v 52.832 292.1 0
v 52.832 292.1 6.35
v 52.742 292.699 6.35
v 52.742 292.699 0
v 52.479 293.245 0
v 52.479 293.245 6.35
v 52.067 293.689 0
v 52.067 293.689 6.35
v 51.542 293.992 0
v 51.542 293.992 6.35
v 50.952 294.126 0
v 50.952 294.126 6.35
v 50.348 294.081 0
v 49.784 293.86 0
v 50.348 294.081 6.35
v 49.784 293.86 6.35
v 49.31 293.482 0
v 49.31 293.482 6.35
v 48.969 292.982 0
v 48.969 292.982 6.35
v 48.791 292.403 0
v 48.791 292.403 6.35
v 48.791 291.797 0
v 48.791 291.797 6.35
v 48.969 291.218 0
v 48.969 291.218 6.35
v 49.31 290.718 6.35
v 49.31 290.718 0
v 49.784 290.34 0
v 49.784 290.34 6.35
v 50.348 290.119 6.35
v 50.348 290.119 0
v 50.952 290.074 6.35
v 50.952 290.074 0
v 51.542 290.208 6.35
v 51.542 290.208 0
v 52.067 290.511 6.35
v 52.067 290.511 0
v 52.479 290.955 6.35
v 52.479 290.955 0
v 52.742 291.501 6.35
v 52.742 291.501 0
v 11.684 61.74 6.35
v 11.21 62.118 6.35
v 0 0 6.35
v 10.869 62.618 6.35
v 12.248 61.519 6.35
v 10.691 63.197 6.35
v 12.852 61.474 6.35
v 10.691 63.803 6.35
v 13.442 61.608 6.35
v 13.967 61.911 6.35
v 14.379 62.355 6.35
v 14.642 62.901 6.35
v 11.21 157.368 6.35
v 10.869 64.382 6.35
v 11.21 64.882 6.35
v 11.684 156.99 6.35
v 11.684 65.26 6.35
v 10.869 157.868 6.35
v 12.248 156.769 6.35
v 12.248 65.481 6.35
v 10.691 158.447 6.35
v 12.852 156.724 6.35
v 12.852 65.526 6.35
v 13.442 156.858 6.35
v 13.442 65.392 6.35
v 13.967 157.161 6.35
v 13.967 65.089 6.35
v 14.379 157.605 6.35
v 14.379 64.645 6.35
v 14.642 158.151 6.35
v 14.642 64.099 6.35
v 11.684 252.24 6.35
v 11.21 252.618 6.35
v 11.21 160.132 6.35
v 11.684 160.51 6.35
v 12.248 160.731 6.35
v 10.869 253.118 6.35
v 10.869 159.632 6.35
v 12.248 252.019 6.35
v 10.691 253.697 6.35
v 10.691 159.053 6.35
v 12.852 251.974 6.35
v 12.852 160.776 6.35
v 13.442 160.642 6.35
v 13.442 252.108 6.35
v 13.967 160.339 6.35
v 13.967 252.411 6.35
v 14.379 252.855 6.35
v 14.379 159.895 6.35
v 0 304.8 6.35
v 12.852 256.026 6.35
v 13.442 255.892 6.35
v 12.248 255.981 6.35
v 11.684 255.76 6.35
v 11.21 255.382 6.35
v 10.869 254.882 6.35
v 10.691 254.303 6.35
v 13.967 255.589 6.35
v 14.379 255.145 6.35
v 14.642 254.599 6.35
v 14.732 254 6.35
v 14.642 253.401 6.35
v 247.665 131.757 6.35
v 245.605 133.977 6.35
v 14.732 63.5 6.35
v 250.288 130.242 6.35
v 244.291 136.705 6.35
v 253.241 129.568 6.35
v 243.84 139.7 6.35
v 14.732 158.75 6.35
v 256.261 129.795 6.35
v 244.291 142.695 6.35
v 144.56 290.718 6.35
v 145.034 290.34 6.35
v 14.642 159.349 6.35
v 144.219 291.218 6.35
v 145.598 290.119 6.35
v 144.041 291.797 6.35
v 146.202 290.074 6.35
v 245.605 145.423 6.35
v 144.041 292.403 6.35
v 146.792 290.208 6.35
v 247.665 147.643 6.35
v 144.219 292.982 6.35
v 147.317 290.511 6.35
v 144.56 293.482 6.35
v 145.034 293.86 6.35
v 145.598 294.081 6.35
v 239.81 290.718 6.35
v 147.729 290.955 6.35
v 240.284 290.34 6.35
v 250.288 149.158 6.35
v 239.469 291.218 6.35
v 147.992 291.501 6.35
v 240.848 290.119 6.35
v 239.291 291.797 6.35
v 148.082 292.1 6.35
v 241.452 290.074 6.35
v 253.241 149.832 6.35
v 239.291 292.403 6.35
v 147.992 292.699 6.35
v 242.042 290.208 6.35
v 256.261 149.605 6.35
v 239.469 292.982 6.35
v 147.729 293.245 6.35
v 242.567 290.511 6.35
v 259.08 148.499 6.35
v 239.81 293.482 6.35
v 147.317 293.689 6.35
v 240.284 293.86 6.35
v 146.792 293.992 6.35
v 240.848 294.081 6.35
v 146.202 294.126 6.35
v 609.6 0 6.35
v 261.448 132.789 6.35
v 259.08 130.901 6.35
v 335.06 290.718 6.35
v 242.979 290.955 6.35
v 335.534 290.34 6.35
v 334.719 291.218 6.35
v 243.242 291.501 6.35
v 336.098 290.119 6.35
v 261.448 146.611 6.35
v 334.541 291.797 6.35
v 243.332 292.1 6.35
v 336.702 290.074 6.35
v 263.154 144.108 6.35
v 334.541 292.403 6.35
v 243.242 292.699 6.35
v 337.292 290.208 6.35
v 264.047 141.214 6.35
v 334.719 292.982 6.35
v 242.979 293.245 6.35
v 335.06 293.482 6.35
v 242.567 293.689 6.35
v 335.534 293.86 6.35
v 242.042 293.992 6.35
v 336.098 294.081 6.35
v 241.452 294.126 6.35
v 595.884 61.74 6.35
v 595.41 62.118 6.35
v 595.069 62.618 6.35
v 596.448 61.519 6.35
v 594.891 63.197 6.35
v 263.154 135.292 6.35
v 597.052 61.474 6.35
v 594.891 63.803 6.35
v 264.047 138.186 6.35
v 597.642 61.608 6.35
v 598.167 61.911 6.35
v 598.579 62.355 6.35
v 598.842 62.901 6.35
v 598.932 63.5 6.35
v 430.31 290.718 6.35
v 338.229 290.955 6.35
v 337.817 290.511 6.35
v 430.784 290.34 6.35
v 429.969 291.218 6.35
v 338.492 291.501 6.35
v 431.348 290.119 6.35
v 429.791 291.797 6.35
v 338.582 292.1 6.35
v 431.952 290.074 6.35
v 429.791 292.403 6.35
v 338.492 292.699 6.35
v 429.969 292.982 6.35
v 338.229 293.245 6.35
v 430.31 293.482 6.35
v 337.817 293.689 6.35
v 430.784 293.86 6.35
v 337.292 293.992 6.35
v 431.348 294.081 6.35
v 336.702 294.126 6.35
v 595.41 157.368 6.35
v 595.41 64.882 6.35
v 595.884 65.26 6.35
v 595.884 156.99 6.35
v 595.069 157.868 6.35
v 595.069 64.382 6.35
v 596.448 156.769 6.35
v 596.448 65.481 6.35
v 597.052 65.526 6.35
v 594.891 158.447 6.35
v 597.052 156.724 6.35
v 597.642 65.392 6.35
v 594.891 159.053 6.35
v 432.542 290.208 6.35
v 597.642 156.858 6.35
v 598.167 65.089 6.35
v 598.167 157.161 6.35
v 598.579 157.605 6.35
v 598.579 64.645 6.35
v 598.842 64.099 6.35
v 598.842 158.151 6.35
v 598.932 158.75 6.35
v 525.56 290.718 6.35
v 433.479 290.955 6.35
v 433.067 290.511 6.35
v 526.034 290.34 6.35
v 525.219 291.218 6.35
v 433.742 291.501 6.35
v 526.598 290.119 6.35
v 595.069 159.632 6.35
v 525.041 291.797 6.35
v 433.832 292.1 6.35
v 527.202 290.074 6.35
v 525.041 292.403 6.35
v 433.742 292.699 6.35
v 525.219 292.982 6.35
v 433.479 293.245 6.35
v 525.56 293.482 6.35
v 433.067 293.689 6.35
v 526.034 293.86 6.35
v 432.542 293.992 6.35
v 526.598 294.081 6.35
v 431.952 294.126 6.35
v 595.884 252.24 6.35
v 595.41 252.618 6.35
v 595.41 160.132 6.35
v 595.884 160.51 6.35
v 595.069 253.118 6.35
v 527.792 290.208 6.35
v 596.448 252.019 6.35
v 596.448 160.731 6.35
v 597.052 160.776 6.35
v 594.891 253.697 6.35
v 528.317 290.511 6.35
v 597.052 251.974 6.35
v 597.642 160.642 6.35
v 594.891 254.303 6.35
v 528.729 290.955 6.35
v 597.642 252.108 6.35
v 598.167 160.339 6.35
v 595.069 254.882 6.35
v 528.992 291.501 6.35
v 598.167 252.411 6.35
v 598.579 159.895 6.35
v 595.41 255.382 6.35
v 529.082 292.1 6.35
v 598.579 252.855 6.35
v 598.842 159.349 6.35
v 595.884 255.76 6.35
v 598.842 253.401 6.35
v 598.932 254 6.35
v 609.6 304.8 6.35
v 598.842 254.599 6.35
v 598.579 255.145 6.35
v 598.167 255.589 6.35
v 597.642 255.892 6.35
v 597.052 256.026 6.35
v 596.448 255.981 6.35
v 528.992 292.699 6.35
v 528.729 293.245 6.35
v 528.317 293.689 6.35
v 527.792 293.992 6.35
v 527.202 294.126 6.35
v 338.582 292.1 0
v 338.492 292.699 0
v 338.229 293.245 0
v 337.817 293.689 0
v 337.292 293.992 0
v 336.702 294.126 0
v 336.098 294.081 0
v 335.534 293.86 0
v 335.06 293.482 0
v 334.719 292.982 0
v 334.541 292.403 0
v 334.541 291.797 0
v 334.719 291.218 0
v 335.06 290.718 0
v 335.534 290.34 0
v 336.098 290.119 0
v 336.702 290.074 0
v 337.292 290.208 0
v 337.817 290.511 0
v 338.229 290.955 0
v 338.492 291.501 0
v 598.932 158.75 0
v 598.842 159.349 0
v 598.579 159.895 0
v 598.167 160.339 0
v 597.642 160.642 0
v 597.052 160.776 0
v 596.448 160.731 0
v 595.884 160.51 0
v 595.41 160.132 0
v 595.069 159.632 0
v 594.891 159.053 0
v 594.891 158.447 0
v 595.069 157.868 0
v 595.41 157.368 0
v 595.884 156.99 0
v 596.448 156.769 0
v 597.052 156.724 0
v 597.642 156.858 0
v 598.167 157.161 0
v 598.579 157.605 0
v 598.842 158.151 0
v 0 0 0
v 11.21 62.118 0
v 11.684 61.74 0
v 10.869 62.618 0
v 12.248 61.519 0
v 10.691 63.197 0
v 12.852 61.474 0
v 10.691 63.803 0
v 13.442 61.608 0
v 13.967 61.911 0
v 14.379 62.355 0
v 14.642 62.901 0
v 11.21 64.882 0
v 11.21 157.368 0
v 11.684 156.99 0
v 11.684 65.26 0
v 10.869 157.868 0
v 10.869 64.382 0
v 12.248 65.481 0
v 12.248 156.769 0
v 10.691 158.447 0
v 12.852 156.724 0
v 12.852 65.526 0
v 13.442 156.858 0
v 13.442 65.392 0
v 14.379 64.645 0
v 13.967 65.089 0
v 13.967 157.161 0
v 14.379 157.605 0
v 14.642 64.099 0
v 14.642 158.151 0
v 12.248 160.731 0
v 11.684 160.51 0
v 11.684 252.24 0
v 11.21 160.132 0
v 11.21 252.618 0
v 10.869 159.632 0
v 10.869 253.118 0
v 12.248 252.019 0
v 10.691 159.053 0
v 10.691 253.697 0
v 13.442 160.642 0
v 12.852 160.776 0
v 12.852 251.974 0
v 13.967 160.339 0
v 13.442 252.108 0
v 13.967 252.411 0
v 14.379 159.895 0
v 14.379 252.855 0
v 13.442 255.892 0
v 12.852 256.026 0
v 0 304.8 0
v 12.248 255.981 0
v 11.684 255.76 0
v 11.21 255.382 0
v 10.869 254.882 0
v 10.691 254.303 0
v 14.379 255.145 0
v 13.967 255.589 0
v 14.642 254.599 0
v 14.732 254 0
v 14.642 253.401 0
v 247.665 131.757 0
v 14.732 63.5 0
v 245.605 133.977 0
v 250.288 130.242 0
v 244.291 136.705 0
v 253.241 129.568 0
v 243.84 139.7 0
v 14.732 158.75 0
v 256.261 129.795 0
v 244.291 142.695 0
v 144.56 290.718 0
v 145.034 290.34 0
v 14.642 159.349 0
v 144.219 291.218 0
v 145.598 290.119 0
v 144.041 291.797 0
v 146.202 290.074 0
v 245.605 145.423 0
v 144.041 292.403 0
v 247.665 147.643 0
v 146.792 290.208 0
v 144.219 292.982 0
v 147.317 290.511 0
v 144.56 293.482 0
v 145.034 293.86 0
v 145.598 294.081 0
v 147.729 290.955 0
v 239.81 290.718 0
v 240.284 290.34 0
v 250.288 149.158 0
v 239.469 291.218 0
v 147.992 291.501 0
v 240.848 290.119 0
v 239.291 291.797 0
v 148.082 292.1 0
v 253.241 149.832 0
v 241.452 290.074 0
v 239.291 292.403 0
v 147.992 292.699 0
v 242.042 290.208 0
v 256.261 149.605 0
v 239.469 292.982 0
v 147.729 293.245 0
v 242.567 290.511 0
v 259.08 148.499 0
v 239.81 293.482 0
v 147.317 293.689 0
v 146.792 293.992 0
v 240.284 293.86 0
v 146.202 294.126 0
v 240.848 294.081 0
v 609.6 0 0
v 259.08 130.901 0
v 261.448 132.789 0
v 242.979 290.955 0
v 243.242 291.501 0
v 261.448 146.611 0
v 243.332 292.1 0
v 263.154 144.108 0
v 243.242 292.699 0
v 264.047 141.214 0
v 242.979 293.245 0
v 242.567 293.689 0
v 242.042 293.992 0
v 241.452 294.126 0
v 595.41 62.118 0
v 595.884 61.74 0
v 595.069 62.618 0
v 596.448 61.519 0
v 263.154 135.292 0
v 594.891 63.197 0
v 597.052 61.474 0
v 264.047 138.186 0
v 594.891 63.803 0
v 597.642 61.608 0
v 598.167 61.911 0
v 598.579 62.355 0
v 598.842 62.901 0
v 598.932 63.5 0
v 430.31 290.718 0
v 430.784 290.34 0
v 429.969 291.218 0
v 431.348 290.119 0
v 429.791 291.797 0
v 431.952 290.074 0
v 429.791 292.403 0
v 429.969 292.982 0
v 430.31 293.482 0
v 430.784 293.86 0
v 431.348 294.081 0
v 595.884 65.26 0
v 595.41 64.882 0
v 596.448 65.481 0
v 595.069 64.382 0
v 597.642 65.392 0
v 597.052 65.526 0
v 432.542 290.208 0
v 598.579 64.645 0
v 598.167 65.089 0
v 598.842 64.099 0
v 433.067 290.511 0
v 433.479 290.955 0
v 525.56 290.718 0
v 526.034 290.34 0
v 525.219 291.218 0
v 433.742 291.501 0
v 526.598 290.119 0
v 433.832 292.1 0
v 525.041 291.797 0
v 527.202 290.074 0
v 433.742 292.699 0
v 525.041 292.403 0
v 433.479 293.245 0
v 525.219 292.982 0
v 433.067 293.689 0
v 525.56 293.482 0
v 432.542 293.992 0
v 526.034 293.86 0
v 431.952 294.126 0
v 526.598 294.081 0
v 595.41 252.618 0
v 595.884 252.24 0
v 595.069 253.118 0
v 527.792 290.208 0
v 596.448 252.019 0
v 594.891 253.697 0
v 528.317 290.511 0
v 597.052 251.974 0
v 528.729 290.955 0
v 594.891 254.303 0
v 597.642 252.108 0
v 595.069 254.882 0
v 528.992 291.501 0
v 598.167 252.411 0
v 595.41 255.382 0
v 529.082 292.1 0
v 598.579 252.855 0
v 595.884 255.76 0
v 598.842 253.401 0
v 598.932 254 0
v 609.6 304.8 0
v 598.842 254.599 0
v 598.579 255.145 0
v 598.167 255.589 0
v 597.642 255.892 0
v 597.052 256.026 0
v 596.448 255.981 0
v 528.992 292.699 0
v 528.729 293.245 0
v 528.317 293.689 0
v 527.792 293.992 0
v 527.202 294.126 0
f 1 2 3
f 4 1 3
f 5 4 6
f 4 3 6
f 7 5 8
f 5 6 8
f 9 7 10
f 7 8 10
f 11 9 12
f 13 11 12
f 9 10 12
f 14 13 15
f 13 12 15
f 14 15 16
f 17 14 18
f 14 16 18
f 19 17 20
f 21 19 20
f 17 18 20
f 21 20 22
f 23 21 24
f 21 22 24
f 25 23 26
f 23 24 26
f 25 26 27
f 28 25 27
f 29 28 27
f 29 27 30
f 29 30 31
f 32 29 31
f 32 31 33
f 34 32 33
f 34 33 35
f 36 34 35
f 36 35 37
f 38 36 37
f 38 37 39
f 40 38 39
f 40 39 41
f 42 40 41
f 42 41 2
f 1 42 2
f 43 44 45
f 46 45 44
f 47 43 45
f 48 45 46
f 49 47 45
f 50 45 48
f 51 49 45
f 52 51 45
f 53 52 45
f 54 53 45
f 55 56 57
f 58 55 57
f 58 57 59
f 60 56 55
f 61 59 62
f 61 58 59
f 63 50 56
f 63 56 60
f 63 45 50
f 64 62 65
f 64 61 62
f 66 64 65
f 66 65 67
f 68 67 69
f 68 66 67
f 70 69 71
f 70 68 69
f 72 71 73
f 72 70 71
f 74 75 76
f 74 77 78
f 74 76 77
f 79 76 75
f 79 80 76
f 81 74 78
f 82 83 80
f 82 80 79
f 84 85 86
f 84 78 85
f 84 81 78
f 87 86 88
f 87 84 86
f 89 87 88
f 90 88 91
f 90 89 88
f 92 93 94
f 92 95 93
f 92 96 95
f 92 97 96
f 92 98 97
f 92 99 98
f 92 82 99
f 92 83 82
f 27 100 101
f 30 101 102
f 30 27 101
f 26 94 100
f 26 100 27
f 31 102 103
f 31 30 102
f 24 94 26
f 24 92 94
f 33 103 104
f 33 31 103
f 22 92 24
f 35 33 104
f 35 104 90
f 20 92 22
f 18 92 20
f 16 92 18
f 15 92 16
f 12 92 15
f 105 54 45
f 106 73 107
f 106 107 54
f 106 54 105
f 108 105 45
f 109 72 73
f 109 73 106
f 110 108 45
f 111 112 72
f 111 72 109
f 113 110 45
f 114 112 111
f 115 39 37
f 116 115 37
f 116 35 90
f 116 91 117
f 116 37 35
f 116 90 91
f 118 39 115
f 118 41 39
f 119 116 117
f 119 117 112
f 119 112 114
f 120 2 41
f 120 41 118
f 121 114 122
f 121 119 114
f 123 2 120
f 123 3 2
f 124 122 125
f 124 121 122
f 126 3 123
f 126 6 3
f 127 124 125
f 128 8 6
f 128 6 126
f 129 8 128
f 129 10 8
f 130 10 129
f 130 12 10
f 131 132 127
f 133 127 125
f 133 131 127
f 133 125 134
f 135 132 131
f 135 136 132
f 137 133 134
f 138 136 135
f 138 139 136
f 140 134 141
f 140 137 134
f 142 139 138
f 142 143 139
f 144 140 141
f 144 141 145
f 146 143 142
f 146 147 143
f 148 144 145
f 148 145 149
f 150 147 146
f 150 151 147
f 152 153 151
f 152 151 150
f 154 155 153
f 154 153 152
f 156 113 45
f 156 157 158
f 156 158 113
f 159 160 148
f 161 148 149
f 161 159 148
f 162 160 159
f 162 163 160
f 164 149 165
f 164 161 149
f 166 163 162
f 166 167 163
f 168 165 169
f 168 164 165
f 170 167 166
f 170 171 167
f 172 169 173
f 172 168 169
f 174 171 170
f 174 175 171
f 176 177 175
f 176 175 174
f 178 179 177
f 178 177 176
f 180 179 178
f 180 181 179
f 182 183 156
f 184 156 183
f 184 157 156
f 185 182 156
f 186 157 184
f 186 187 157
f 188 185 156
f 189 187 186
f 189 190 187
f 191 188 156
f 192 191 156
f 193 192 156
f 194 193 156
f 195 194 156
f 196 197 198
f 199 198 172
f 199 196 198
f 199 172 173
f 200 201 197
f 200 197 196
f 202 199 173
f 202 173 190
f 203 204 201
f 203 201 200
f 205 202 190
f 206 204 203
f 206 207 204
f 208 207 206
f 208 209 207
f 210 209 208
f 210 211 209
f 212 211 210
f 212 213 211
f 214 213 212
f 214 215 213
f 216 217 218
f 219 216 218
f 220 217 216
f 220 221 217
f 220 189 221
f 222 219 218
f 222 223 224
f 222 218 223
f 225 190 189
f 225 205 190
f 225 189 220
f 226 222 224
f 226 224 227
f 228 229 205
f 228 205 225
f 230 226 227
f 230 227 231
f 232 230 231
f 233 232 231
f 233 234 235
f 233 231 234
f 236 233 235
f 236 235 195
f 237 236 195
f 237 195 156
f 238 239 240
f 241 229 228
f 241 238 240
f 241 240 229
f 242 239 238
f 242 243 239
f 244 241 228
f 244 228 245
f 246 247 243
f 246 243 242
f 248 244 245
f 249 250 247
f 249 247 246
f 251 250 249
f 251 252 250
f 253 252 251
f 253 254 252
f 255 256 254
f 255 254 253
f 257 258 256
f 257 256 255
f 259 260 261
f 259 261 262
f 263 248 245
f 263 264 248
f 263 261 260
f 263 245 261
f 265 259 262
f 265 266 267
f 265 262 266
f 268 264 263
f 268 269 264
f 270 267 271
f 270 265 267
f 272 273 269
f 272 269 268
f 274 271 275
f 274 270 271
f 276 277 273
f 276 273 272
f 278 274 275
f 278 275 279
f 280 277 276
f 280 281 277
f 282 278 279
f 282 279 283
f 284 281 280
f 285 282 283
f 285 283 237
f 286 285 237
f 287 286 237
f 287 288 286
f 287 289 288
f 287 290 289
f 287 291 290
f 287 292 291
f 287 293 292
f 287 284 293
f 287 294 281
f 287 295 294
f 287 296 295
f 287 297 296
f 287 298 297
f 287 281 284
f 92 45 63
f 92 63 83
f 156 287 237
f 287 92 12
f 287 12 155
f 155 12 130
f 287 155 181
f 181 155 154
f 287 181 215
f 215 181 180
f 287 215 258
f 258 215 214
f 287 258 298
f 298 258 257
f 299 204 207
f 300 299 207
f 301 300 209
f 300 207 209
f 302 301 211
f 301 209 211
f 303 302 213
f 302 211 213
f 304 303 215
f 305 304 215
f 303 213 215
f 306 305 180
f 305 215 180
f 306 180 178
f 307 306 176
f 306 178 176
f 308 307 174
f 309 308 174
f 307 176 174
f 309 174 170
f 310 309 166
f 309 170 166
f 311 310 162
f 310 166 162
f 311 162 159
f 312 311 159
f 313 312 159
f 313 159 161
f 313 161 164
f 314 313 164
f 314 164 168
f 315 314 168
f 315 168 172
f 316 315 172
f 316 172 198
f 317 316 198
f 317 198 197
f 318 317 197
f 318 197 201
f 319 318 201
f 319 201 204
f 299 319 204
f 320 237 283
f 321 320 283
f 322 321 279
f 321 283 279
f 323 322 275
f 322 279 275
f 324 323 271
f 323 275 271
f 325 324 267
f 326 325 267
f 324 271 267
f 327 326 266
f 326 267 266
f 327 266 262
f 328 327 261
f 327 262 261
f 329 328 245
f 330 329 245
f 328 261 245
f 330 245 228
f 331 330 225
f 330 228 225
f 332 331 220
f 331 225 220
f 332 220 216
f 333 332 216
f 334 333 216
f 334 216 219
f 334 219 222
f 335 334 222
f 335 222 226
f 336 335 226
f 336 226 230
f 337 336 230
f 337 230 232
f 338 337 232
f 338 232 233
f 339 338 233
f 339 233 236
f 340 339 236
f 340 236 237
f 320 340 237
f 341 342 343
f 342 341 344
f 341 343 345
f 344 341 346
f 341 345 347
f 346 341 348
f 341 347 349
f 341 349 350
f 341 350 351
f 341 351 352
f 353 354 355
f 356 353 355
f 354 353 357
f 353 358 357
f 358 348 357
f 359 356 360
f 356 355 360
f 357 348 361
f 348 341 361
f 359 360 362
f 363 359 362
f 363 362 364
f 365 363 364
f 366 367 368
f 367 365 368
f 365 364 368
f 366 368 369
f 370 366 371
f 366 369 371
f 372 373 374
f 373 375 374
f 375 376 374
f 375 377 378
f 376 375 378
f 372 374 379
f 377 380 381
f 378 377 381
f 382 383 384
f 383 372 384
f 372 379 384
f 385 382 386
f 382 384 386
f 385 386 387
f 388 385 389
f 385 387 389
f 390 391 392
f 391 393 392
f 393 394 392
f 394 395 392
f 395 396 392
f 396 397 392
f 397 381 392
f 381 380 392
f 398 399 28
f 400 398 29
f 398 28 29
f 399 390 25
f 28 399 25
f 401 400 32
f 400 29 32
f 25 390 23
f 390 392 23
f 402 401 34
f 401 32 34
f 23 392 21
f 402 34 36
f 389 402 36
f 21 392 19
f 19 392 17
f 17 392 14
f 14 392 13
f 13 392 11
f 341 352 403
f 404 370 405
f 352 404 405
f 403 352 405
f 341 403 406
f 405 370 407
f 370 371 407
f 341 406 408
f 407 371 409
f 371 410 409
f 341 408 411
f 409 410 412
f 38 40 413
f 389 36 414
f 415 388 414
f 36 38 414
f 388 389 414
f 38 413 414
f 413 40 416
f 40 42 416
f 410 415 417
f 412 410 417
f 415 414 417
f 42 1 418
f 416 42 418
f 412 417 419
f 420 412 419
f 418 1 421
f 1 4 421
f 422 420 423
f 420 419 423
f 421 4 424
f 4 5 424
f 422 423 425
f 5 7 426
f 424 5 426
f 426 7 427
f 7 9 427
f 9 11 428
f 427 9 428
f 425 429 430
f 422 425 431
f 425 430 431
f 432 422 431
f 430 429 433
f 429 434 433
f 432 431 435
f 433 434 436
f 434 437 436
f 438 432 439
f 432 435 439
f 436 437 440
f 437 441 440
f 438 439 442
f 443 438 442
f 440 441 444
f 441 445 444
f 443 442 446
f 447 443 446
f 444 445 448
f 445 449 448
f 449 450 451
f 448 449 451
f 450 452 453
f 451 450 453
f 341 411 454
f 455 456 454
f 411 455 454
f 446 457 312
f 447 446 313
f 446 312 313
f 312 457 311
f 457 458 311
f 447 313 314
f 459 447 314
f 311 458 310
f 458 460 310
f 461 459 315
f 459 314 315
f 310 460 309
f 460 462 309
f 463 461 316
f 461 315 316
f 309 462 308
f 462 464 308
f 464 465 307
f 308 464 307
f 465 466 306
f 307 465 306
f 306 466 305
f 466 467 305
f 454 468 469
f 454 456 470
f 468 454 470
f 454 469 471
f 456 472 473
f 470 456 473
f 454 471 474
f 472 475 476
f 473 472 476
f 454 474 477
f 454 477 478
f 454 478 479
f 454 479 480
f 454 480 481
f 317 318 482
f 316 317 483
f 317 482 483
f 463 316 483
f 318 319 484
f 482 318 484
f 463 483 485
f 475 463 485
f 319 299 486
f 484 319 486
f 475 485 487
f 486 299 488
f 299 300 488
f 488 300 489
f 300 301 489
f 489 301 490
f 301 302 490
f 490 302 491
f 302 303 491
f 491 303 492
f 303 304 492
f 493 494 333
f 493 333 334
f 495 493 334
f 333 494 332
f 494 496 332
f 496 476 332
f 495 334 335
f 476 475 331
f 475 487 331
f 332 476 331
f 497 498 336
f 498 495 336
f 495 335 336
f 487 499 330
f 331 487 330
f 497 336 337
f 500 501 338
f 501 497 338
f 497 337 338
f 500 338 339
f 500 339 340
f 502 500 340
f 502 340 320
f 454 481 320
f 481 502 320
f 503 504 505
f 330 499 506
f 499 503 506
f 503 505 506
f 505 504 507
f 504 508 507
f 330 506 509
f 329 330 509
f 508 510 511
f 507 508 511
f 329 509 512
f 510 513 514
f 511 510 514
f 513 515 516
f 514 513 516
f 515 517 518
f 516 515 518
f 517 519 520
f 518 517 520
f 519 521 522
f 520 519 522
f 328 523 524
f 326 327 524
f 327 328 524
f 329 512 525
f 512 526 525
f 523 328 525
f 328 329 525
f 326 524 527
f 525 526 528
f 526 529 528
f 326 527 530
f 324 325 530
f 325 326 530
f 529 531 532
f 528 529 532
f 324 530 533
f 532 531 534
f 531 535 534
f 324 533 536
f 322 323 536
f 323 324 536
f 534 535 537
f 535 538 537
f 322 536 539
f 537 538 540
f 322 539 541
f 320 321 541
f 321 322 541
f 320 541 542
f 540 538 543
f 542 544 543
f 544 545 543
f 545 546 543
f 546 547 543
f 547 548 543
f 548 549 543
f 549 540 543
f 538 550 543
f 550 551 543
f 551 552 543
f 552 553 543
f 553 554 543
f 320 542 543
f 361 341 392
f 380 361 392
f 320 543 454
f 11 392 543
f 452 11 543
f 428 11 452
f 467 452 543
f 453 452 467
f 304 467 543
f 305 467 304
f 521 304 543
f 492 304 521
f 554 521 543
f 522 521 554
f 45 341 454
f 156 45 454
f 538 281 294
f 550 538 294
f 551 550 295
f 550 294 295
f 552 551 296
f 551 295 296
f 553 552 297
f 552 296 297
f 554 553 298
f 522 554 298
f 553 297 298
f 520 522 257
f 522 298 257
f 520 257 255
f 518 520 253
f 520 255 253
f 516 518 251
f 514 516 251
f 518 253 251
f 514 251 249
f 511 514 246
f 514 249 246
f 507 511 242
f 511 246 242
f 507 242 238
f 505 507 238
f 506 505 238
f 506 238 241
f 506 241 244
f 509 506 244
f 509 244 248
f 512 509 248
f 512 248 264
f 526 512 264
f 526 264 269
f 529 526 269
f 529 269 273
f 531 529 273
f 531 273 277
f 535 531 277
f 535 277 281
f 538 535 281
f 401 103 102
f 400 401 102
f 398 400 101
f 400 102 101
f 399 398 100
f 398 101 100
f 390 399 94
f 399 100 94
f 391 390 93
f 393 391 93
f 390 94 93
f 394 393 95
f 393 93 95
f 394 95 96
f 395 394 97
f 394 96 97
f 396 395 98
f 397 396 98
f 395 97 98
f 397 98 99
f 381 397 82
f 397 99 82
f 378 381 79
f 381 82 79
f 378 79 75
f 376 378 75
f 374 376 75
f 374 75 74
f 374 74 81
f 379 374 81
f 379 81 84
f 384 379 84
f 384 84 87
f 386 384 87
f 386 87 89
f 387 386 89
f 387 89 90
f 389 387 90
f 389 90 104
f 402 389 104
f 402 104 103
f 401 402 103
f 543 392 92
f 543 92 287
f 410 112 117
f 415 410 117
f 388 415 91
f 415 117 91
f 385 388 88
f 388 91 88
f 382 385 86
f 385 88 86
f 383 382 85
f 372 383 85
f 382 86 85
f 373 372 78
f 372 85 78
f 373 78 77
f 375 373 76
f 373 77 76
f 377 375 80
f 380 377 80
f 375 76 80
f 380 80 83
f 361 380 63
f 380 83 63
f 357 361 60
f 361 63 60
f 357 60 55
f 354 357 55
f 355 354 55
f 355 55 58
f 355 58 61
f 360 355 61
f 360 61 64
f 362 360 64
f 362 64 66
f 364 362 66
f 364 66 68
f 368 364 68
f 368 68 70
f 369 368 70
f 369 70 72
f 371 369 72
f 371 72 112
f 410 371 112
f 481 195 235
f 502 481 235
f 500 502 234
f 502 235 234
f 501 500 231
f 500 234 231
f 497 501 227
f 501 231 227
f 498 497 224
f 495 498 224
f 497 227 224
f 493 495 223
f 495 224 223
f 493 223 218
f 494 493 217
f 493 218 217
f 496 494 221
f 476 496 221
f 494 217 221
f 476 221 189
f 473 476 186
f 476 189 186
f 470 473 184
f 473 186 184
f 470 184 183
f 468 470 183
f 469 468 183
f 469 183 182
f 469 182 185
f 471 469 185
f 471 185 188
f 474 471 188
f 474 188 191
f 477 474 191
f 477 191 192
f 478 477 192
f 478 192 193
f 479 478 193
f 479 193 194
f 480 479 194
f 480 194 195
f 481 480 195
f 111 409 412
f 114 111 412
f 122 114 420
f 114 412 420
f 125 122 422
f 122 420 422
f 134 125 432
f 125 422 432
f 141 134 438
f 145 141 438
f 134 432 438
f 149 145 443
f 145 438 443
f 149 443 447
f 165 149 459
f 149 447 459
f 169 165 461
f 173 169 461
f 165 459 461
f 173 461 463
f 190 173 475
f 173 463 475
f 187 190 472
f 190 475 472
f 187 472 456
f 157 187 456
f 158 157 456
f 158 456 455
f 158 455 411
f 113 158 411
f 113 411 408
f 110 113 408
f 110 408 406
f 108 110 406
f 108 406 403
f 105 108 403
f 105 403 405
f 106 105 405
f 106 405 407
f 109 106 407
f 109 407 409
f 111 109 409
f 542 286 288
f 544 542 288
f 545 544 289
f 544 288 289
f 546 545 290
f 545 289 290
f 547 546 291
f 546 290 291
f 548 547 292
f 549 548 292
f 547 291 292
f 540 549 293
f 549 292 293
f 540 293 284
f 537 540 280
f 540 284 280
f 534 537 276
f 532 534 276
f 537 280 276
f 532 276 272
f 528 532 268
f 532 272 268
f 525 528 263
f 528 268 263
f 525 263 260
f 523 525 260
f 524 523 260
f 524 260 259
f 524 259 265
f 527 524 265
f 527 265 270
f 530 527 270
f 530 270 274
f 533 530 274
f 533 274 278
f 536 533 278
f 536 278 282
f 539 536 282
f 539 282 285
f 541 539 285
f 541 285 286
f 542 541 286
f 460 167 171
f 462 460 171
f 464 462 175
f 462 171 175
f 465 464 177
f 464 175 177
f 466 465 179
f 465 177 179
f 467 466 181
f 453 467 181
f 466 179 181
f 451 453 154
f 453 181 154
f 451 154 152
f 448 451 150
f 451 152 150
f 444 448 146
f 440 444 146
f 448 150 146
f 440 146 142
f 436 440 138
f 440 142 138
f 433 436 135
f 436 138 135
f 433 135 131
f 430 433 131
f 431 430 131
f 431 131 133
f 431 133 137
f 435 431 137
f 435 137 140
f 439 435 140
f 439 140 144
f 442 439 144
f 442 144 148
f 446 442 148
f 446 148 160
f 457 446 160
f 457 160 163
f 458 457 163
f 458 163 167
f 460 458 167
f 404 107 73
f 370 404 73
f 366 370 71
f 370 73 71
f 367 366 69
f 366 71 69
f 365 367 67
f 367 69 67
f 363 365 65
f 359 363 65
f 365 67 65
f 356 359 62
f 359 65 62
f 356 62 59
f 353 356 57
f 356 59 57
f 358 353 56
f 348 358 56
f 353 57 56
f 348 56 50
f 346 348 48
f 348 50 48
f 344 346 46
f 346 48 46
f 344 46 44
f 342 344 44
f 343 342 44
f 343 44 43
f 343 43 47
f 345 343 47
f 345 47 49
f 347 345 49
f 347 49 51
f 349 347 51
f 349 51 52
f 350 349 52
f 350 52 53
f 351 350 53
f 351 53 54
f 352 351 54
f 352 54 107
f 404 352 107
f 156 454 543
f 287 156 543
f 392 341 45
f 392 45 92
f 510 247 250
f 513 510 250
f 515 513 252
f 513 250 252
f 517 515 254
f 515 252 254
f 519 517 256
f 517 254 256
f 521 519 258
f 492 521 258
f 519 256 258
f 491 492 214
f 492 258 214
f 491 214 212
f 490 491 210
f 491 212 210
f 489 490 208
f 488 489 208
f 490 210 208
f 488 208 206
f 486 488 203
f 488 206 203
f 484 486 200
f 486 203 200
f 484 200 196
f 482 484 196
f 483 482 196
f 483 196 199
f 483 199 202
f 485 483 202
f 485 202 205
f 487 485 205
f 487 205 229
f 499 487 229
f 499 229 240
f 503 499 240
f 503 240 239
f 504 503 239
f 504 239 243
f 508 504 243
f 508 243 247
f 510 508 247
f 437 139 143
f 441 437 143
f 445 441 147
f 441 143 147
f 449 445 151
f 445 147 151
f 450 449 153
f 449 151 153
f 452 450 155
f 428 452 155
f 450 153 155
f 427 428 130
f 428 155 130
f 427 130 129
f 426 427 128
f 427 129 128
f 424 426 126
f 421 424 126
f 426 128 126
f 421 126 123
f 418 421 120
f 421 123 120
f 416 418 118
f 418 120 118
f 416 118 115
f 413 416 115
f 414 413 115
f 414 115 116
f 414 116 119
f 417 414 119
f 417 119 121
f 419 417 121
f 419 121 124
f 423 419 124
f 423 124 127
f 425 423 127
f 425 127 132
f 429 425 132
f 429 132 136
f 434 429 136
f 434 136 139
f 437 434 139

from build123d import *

# Parameters (mm, degrees)
SKETCH1_W           = 609.6
SKETCH1_H           = 304.8
BOSS_EXTRUDE1_DEPTH = 6.35
SKETCH2_R           = 2.032
CUT_EXTRUDE4_DEPTH  = 7.35
SKETCH4_R           = 2.032
CUT_EXTRUDE7_DEPTH  = 7.35
SKETCH5_R           = 10.16
CUT_EXTRUDE8_DEPTH  = 7.35


with BuildPart() as part:
    # Sketch1 → Boss-Extrude1 (new body)
    with BuildSketch(Plane.XY):
        with Locations((304.8, 152.4)):
            Rectangle(SKETCH1_W, SKETCH1_H)
    extrude(amount=BOSS_EXTRUDE1_DEPTH)

    # Sketch2 → Cut-Extrude4 (cut, through all)
    with BuildSketch(Plane.XY.offset(6.35)):
        with Locations((12.7, 254)):
            Circle(SKETCH2_R)
        with Locations((12.7, 158.75)):
            Circle(SKETCH2_R)
        with Locations((12.7, 63.5)):
            Circle(SKETCH2_R)
        with Locations((596.9, 63.5)):
            Circle(SKETCH2_R)
        with Locations((596.9, 158.75)):
            Circle(SKETCH2_R)
        with Locations((596.9, 254)):
            Circle(SKETCH2_R)
    extrude(amount=-CUT_EXTRUDE4_DEPTH, mode=Mode.SUBTRACT)

    # Sketch4 → Cut-Extrude7 (cut, through all)
    with BuildSketch(Plane.XY.offset(6.35)):
        with Locations((50.8, 292.1)):
            Circle(SKETCH4_R)
        with Locations((146.05, 292.1)):
            Circle(SKETCH4_R)
        with Locations((241.3, 292.1)):
            Circle(SKETCH4_R)
        with Locations((336.55, 292.1)):
            Circle(SKETCH4_R)
        with Locations((431.8, 292.1)):
            Circle(SKETCH4_R)
        with Locations((527.05, 292.1)):
            Circle(SKETCH4_R)
    extrude(amount=-CUT_EXTRUDE7_DEPTH, mode=Mode.SUBTRACT)

    # Sketch5 → Cut-Extrude8 (cut, through all)
    with BuildSketch(Plane(origin=(0, 0, 0), x_dir=(-1, 0, 0), z_dir=(0, 0, -1))):
        with Locations((-254, 139.7)):
            Circle(SKETCH5_R)
    extrude(amount=-CUT_EXTRUDE8_DEPTH, mode=Mode.SUBTRACT)


solid = part.part
